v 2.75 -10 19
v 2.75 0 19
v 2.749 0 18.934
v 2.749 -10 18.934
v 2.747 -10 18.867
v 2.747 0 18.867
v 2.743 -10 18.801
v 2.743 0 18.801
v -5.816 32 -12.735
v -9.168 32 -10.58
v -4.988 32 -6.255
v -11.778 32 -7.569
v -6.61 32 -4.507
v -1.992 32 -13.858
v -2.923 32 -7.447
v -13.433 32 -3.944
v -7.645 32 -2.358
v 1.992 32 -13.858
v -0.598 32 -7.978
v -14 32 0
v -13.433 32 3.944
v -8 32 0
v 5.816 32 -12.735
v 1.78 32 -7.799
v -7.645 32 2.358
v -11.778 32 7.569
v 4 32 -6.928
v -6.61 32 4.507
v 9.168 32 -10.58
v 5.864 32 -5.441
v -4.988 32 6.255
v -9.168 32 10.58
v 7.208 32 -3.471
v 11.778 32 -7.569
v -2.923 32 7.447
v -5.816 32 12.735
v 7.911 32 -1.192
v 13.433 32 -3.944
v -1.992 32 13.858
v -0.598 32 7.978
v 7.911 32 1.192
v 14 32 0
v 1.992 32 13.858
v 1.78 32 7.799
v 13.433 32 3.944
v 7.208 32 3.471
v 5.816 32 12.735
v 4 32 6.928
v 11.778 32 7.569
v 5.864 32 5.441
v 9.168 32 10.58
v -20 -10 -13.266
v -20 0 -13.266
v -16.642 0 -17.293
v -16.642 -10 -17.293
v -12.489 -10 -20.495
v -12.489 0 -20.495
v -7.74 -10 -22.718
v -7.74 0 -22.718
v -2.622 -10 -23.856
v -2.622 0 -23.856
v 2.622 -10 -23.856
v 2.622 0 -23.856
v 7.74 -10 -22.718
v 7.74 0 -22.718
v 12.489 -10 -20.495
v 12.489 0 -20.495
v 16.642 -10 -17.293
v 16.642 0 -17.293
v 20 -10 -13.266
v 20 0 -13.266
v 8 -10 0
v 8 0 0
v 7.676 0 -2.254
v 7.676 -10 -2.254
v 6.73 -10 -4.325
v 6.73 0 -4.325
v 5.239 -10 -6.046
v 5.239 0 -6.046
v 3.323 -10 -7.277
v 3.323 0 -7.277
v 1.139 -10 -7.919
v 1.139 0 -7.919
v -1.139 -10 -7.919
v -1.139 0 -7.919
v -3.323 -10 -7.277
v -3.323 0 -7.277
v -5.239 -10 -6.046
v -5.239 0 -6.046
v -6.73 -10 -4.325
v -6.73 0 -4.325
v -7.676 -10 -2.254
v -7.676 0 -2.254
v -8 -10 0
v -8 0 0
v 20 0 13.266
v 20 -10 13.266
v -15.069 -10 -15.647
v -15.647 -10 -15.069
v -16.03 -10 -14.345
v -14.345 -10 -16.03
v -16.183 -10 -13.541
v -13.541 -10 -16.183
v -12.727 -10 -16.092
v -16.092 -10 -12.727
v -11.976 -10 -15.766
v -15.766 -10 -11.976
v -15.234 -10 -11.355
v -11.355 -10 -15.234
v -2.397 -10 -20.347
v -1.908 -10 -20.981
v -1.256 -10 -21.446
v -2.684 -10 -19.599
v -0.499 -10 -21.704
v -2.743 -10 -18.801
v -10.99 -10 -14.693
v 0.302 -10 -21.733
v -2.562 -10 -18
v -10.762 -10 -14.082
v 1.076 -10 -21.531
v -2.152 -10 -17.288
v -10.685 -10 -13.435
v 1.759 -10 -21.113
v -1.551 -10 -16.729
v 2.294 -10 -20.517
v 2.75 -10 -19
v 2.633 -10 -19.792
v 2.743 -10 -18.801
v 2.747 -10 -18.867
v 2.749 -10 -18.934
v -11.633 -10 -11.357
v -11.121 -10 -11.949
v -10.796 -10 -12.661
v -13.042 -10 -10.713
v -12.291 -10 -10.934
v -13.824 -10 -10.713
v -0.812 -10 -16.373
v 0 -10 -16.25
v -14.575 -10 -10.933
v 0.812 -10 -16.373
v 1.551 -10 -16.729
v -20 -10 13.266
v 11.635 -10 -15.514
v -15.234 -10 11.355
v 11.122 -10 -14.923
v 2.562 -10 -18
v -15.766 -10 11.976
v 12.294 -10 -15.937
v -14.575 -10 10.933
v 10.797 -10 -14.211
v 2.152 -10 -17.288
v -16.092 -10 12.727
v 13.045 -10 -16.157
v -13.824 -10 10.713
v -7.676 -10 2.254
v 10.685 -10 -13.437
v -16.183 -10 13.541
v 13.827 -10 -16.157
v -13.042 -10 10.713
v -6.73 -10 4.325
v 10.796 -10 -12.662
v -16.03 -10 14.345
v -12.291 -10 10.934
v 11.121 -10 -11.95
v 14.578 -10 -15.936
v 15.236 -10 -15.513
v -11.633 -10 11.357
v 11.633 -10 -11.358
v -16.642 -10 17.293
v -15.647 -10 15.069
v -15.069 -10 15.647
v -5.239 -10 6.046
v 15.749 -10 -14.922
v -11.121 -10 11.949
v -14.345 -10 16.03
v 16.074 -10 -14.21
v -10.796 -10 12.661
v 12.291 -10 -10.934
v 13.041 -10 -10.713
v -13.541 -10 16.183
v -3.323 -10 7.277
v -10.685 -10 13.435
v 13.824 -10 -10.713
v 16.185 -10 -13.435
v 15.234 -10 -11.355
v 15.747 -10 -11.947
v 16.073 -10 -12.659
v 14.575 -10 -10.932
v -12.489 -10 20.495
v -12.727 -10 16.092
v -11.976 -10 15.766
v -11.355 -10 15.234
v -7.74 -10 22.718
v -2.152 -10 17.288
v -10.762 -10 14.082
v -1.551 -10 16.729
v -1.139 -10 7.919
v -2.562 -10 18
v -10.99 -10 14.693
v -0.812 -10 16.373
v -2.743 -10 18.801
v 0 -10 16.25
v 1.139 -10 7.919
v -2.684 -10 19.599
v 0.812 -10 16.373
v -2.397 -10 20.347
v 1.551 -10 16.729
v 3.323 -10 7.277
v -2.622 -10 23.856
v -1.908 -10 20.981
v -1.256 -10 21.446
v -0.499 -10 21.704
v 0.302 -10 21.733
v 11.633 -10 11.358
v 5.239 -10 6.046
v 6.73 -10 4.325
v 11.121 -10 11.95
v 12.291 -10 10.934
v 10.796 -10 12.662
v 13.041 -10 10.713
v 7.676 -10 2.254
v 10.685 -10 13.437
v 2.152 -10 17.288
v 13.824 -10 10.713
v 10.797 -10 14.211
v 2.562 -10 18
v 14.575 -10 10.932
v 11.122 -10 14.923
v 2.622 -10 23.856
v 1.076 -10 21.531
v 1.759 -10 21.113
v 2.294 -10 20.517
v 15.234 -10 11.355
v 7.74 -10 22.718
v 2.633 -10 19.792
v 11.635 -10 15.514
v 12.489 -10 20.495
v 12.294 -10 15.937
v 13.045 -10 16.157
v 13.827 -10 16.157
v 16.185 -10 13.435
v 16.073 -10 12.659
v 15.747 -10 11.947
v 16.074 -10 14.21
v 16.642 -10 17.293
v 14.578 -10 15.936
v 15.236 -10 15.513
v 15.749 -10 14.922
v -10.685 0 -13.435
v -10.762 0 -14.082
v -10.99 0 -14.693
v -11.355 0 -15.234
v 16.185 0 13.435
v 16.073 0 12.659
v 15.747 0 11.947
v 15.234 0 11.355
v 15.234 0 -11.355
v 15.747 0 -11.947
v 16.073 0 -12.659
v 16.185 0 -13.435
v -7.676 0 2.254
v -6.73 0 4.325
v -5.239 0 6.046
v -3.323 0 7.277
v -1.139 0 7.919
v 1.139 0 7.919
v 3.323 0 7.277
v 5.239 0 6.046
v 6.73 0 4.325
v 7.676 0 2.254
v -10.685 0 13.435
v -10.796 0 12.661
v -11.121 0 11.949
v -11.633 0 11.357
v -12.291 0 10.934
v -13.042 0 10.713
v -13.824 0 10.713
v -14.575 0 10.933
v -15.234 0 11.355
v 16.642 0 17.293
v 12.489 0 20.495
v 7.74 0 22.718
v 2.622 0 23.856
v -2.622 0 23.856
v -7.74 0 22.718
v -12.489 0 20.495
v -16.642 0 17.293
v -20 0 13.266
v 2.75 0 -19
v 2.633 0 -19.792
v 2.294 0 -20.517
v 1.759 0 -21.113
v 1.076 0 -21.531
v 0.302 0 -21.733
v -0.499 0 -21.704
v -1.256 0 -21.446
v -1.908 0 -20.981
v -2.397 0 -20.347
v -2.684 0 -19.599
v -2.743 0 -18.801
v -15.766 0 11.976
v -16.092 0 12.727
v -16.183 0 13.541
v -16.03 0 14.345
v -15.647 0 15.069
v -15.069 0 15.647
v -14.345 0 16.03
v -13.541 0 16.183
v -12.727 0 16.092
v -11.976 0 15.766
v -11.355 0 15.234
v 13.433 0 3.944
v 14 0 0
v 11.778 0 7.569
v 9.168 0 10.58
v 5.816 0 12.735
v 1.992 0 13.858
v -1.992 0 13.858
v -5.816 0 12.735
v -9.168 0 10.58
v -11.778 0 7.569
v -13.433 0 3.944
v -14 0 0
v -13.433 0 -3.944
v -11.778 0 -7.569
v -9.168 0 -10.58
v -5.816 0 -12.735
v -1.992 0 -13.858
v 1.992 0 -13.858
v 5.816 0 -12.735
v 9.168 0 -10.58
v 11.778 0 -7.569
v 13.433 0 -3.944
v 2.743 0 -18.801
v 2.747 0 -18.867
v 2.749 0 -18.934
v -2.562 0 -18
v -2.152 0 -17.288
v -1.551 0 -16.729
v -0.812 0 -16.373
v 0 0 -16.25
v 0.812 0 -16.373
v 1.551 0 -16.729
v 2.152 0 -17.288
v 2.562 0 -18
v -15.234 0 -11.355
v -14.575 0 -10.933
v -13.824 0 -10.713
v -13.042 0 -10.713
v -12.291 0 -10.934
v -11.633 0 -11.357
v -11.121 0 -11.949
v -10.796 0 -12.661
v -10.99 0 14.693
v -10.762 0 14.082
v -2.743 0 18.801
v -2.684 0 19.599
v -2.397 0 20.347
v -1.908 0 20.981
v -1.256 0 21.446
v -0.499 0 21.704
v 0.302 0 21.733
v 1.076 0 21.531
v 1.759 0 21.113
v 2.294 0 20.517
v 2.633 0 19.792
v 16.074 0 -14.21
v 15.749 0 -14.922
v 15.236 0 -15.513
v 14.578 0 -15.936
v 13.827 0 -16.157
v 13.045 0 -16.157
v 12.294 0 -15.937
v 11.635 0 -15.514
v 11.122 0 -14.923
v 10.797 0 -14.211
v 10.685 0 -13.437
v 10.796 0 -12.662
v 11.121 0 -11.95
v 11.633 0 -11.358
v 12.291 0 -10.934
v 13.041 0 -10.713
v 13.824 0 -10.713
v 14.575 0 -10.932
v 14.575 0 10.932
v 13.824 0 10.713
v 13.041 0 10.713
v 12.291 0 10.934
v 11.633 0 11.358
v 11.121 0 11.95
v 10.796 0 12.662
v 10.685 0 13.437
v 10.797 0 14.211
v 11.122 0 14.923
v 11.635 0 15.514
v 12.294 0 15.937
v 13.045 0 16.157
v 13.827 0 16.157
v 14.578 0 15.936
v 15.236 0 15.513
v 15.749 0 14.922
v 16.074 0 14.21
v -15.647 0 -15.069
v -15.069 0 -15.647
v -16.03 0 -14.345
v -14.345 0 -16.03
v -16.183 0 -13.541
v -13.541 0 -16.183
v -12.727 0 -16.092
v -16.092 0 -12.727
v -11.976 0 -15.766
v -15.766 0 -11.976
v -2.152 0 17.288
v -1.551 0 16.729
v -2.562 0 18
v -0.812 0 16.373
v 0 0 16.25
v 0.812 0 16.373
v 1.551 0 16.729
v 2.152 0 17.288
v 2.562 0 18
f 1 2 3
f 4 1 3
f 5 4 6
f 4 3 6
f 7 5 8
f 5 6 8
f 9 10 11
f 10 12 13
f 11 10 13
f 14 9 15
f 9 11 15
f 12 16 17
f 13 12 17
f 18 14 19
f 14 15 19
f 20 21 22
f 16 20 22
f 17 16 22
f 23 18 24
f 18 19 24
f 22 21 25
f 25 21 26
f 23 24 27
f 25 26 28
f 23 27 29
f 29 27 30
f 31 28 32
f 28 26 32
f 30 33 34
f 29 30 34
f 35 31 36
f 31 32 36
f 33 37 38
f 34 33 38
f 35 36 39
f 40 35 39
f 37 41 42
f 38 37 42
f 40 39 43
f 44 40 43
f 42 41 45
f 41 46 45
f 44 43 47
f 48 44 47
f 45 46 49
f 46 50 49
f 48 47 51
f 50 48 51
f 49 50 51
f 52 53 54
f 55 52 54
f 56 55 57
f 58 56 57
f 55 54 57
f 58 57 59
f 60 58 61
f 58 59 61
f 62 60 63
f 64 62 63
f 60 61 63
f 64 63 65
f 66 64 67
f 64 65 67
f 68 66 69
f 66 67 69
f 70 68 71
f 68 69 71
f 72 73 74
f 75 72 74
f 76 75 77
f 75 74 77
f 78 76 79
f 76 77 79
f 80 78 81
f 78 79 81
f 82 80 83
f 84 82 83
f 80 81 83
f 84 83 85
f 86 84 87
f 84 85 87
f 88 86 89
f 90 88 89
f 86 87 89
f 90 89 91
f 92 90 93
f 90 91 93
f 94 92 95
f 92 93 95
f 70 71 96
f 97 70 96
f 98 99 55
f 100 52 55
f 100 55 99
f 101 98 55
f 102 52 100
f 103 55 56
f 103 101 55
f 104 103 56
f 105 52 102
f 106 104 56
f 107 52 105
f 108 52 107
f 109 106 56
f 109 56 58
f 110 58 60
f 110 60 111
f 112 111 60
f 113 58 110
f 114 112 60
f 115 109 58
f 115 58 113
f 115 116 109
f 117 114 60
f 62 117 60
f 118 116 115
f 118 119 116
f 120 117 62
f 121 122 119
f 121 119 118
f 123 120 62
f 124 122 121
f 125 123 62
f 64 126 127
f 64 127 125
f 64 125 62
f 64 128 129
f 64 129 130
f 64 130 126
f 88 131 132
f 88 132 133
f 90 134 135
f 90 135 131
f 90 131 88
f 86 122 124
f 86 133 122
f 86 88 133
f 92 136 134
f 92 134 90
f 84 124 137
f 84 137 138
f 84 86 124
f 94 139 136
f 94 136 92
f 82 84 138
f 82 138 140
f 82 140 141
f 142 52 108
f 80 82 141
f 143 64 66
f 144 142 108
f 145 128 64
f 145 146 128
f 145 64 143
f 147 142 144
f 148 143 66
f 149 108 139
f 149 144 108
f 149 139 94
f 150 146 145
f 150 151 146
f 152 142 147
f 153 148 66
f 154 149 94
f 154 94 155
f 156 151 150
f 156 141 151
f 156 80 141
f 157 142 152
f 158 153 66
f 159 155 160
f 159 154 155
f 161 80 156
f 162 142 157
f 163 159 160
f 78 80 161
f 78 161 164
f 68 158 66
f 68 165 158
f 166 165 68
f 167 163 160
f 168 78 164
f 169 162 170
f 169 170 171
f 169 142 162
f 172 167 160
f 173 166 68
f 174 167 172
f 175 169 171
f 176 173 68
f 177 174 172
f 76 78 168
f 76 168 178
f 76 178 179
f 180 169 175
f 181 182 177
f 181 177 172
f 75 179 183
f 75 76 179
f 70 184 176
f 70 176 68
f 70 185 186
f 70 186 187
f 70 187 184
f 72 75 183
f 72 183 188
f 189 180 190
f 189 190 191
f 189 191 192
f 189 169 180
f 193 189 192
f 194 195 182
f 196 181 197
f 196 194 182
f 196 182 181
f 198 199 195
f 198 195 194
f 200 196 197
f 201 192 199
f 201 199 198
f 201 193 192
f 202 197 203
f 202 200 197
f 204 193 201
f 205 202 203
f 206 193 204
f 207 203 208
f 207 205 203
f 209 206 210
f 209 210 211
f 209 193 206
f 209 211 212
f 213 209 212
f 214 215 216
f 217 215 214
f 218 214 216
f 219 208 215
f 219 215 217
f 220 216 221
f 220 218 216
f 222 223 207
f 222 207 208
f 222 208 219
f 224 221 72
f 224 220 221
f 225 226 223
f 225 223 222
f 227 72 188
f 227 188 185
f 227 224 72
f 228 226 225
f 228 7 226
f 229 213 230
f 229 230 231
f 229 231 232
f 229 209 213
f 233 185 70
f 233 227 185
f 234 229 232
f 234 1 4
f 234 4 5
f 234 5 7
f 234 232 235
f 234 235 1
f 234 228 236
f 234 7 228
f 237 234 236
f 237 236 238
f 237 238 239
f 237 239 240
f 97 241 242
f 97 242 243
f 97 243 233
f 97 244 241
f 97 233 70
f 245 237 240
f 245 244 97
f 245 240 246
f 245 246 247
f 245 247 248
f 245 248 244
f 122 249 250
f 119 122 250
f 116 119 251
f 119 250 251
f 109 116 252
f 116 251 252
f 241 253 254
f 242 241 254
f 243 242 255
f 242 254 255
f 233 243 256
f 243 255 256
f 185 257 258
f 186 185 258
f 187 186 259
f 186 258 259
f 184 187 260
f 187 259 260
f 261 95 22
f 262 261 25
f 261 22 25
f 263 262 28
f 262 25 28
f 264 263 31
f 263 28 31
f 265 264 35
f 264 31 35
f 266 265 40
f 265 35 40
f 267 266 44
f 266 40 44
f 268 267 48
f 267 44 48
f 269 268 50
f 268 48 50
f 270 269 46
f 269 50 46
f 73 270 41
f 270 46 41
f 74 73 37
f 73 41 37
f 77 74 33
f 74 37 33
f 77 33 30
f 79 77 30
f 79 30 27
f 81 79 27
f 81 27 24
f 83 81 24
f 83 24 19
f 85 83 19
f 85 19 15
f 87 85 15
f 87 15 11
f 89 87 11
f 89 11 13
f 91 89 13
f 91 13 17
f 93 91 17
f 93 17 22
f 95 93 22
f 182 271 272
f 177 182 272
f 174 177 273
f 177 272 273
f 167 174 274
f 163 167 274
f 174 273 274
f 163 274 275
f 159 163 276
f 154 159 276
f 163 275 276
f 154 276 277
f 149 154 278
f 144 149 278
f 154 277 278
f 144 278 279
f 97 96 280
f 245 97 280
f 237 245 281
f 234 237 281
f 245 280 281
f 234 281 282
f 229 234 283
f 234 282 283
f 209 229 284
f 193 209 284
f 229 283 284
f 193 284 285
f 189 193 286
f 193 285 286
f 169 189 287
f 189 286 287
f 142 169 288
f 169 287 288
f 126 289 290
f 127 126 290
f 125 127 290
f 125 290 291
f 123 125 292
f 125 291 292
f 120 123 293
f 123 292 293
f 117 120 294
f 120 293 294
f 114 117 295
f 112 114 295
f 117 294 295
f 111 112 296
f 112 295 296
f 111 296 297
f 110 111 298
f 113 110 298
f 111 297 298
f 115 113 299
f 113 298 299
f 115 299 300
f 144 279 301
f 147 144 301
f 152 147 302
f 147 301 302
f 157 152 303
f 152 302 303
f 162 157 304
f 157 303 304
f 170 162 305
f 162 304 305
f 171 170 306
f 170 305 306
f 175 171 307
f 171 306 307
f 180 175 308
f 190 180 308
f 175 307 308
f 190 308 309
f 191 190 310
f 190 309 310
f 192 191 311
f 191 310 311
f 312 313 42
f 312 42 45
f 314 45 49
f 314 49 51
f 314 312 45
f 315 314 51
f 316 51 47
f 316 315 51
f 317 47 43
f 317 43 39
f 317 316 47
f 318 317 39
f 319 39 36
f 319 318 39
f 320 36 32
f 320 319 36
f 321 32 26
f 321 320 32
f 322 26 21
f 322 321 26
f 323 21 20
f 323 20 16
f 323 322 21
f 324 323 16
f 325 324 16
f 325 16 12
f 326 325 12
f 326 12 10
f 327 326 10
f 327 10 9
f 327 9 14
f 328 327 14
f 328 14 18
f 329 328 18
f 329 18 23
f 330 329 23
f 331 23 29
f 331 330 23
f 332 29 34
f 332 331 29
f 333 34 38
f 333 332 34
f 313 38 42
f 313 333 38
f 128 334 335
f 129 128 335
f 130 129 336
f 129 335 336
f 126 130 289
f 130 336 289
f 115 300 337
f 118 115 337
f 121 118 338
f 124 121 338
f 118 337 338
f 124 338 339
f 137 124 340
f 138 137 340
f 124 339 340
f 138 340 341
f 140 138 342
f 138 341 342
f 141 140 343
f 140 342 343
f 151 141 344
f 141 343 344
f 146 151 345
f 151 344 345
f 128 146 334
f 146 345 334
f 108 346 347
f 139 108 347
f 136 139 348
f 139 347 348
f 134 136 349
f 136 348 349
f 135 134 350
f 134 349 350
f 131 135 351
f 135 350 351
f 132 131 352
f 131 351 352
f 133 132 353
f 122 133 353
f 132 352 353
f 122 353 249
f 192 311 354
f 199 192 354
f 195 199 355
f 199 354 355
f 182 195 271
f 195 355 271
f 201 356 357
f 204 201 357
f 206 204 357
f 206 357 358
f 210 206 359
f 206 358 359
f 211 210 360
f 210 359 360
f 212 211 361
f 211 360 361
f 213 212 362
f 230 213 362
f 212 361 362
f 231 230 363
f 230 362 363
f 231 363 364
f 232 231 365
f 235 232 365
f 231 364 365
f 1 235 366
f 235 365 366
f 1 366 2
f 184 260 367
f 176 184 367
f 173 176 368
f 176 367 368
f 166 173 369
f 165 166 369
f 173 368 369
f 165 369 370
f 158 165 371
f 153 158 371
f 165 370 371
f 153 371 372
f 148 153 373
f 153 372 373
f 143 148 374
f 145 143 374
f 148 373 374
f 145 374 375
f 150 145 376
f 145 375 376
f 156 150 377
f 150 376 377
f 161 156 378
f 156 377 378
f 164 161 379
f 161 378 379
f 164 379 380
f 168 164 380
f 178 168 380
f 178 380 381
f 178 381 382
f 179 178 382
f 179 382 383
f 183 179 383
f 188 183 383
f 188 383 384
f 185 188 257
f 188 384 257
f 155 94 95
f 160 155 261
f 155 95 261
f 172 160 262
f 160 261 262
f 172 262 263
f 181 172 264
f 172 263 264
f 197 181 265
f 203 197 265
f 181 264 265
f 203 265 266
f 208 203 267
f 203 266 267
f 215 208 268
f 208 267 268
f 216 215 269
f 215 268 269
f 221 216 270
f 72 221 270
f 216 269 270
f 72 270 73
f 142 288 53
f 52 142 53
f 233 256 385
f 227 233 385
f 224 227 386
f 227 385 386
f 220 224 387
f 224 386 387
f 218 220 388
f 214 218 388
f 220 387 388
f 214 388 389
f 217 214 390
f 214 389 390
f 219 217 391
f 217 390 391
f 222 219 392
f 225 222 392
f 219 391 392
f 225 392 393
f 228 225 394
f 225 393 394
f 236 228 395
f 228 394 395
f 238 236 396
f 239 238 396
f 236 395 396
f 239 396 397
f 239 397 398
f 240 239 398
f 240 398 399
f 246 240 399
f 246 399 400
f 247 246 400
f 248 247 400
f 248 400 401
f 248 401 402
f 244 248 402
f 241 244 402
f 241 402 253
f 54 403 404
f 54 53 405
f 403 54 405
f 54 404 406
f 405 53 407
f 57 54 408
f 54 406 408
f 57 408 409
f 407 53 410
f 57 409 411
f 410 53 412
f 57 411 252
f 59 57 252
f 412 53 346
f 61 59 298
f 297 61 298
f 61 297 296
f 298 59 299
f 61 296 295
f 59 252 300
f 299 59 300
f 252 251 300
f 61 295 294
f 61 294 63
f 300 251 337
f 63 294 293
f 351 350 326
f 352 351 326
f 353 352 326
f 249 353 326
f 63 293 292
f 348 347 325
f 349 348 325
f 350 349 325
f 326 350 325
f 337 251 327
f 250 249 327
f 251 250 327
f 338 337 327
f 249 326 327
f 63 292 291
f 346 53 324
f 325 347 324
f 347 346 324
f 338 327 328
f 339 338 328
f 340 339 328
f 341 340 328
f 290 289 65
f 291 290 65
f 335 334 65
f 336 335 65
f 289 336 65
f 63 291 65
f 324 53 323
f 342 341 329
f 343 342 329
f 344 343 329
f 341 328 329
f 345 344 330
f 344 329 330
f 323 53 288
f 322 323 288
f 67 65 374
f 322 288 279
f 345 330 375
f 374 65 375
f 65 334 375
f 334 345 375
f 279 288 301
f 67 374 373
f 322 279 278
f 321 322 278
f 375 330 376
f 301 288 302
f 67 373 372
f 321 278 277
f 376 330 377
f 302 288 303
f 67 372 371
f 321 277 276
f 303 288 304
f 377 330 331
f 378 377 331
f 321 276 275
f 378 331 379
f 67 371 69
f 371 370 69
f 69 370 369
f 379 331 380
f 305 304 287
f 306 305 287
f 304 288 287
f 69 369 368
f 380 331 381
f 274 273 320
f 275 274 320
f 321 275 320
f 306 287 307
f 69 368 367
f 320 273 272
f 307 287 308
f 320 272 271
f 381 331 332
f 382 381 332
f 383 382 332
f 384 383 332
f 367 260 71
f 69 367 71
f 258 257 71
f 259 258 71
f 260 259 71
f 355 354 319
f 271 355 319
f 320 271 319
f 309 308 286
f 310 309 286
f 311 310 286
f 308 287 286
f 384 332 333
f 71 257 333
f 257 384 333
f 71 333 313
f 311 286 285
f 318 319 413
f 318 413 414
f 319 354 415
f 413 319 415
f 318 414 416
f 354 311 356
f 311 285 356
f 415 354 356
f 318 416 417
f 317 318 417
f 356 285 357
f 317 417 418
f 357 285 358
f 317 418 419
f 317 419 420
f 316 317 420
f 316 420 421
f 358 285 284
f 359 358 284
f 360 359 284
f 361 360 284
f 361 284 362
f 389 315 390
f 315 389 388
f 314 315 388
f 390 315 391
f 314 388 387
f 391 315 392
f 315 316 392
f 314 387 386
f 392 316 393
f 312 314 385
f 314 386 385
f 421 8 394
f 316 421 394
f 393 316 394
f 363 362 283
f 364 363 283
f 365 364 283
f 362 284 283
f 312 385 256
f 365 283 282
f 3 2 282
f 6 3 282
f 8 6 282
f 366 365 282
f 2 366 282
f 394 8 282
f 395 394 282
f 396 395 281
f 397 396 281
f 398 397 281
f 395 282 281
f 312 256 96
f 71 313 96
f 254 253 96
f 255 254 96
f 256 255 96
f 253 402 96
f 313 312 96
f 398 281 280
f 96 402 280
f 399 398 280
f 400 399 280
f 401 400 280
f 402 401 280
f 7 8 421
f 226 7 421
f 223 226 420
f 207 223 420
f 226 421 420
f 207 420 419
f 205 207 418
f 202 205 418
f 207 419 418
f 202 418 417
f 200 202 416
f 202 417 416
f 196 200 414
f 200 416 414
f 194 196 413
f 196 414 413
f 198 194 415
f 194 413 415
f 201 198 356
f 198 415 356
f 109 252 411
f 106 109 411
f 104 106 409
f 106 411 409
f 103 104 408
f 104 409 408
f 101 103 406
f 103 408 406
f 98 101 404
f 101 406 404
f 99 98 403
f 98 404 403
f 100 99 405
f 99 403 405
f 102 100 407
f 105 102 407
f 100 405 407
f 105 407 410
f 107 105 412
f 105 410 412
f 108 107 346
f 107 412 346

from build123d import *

# Parameters (mm, degrees)
F0_R     = 14
F1_DEPTH = 32
F2_DEPTH = 10
F3_D     = 16
F3_DEPTH = 50
F3_TIP   = 4.8068849522
F4_D     = 16
F4_DEPTH = 50
F4_TIP   = 4.8068849522


with BuildPart() as f1:
    # F0 (on Front) → F1 (new body)
    with BuildSketch(Plane.XZ):
        Circle(F0_R)
    extrude(amount=-F1_DEPTH)

    # F0 (on Front) → F2 (join)
    with BuildSketch(Plane.XZ):
        with BuildLine():
            Line((20, -13.2664991614), (20, 13.2664991614))
            ThreePointArc((20, 13.2664991614), (0, 24), (-20, 13.2664991614))
            Line((-20, 13.2664991614), (-20, -13.2664991614))
            ThreePointArc((-20, -13.2664991614), (0, -24), (20, -13.2664991614))
        make_face()
        with BuildLine():
            ThreePointArc((15.2337502822, 11.3548602959), (18.0338744501, 5.981586104), (19, 0))
            ThreePointArc((19, 0), (18.0338744501, -5.981586104), (15.2337502822, -11.3548602959))
            ThreePointArc((15.2337502822, -11.3548602959), (15.9359270771, -12.2913470597), (16.1850288425, -13.4350288425))
            ThreePointArc((16.1850288425, -13.4350288425), (14.3947257991, -16.0121360874), (11.3548602959, -15.2337502822))
            ThreePointArc((11.3548602959, -15.2337502822), (7.2709852149, -17.5537111177), (2.7427894128, -18.8009868421))
            ThreePointArc((2.7427894128, -18.8009868421), (2.748196762, -18.9004281295), (2.75, -19))
            ThreePointArc((2.75, -19), (-0.0995718705, -21.748196762), (-2.7427894128, -18.8009868421))
            ThreePointArc((-2.7427894128, -18.8009868421), (-7.2709852149, -17.5537111177), (-11.3548602959, -15.2337502822))
            ThreePointArc((-11.3548602959, -15.2337502822), (-15.3795724908, -15.3795724908), (-15.2337502822, -11.3548602959))
            ThreePointArc((-15.2337502822, -11.3548602959), (-19, 0), (-15.2337502822, 11.3548602959))
            ThreePointArc((-15.2337502822, 11.3548602959), (-15.3795724908, 15.3795724908), (-11.3548602959, 15.2337502822))
            ThreePointArc((-11.3548602959, 15.2337502822), (-7.2709852149, 17.5537111177), (-2.7427894128, 18.8009868421))
            ThreePointArc((-2.7427894128, 18.8009868421), (-0.0995718705, 21.748196762), (2.75, 19))
            ThreePointArc((2.75, 19), (2.748196762, 18.9004281295), (2.7427894128, 18.8009868421))
            ThreePointArc((2.7427894128, 18.8009868421), (7.2709852149, 17.5537111177), (11.3548602959, 15.2337502822))
            ThreePointArc((11.3548602959, 15.2337502822), (14.3947257991, 16.0121360874), (16.1850288425, 13.4350288425))
            ThreePointArc((16.1850288425, 13.4350288425), (15.9359270771, 12.2913470597), (15.2337502822, 11.3548602959))
        make_face(mode=Mode.SUBTRACT)
        with BuildLine():
            ThreePointArc((15.2337502822, -11.3548602959), (18.0338744501, -5.981586104), (19, 0))
            ThreePointArc((19, 0), (18.0338744501, 5.981586104), (15.2337502822, 11.3548602959))
            ThreePointArc((15.2337502822, 11.3548602959), (11.4904851943, 11.4904851943), (11.3548602959, 15.2337502822))
            ThreePointArc((11.3548602959, 15.2337502822), (7.2709852149, 17.5537111177), (2.7427894128, 18.8009868421))
            ThreePointArc((2.7427894128, 18.8009868421), (0, 16.25), (-2.7427894128, 18.8009868421))
            ThreePointArc((-2.7427894128, 18.8009868421), (-7.2709852149, 17.5537111177), (-11.3548602959, 15.2337502822))
            ThreePointArc((-11.3548602959, 15.2337502822), (-10.8579215977, 14.3947257991), (-10.6850288425, 13.4350288425))
            ThreePointArc((-10.6850288425, 13.4350288425), (-12.2913470597, 10.934130608), (-15.2337502822, 11.3548602959))
            ThreePointArc((-15.2337502822, 11.3548602959), (-19, 0), (-15.2337502822, -11.3548602959))
            ThreePointArc((-15.2337502822, -11.3548602959), (-12.2913470597, -10.934130608), (-10.6850288425, -13.4350288425))
            ThreePointArc((-10.6850288425, -13.4350288425), (-10.8579215977, -14.3947257991), (-11.3548602959, -15.2337502822))
            ThreePointArc((-11.3548602959, -15.2337502822), (-7.2709852149, -17.5537111177), (-2.7427894128, -18.8009868421))
            ThreePointArc((-2.7427894128, -18.8009868421), (0, -16.25), (2.7427894128, -18.8009868421))
            ThreePointArc((2.7427894128, -18.8009868421), (7.2709852149, -17.5537111177), (11.3548602959, -15.2337502822))
            ThreePointArc((11.3548602959, -15.2337502822), (11.4904851943, -11.4904851943), (15.2337502822, -11.3548602959))
        make_face()
        Circle(F0_R, mode=Mode.SUBTRACT)
        Circle(F0_R)
    extrude(amount=F2_DEPTH)

    # F3 (one way)
    with BuildSketch(Plane(origin=(0, 0, 0), x_dir=(1, 0, 0), z_dir=(0, 1, 0))):
        with Locations((0, 0)):
            Circle(F3_D / 2)
    extrude(amount=-F3_DEPTH, mode=Mode.SUBTRACT)
    with Locations(Plane(origin=(0, 0, 0), x_dir=(1, 0, 0), z_dir=(0, 1, 0))):
        with Locations((0, 0)):
            with Locations((0, 0, -(F3_DEPTH + F3_TIP / 2))):  # 118° drill point
                Cone(0, F3_D / 2, F3_TIP, mode=Mode.SUBTRACT)

    # F4
    with Locations(Plane.XZ):
        with Locations((0, 0)):
            Hole(F4_D / 2, depth=F4_DEPTH)
            with Locations((0, 0, -(F4_DEPTH + F4_TIP / 2))):  # 118° drill point
                Cone(0, F4_D / 2, F4_TIP, mode=Mode.SUBTRACT)


solid = f1.part
